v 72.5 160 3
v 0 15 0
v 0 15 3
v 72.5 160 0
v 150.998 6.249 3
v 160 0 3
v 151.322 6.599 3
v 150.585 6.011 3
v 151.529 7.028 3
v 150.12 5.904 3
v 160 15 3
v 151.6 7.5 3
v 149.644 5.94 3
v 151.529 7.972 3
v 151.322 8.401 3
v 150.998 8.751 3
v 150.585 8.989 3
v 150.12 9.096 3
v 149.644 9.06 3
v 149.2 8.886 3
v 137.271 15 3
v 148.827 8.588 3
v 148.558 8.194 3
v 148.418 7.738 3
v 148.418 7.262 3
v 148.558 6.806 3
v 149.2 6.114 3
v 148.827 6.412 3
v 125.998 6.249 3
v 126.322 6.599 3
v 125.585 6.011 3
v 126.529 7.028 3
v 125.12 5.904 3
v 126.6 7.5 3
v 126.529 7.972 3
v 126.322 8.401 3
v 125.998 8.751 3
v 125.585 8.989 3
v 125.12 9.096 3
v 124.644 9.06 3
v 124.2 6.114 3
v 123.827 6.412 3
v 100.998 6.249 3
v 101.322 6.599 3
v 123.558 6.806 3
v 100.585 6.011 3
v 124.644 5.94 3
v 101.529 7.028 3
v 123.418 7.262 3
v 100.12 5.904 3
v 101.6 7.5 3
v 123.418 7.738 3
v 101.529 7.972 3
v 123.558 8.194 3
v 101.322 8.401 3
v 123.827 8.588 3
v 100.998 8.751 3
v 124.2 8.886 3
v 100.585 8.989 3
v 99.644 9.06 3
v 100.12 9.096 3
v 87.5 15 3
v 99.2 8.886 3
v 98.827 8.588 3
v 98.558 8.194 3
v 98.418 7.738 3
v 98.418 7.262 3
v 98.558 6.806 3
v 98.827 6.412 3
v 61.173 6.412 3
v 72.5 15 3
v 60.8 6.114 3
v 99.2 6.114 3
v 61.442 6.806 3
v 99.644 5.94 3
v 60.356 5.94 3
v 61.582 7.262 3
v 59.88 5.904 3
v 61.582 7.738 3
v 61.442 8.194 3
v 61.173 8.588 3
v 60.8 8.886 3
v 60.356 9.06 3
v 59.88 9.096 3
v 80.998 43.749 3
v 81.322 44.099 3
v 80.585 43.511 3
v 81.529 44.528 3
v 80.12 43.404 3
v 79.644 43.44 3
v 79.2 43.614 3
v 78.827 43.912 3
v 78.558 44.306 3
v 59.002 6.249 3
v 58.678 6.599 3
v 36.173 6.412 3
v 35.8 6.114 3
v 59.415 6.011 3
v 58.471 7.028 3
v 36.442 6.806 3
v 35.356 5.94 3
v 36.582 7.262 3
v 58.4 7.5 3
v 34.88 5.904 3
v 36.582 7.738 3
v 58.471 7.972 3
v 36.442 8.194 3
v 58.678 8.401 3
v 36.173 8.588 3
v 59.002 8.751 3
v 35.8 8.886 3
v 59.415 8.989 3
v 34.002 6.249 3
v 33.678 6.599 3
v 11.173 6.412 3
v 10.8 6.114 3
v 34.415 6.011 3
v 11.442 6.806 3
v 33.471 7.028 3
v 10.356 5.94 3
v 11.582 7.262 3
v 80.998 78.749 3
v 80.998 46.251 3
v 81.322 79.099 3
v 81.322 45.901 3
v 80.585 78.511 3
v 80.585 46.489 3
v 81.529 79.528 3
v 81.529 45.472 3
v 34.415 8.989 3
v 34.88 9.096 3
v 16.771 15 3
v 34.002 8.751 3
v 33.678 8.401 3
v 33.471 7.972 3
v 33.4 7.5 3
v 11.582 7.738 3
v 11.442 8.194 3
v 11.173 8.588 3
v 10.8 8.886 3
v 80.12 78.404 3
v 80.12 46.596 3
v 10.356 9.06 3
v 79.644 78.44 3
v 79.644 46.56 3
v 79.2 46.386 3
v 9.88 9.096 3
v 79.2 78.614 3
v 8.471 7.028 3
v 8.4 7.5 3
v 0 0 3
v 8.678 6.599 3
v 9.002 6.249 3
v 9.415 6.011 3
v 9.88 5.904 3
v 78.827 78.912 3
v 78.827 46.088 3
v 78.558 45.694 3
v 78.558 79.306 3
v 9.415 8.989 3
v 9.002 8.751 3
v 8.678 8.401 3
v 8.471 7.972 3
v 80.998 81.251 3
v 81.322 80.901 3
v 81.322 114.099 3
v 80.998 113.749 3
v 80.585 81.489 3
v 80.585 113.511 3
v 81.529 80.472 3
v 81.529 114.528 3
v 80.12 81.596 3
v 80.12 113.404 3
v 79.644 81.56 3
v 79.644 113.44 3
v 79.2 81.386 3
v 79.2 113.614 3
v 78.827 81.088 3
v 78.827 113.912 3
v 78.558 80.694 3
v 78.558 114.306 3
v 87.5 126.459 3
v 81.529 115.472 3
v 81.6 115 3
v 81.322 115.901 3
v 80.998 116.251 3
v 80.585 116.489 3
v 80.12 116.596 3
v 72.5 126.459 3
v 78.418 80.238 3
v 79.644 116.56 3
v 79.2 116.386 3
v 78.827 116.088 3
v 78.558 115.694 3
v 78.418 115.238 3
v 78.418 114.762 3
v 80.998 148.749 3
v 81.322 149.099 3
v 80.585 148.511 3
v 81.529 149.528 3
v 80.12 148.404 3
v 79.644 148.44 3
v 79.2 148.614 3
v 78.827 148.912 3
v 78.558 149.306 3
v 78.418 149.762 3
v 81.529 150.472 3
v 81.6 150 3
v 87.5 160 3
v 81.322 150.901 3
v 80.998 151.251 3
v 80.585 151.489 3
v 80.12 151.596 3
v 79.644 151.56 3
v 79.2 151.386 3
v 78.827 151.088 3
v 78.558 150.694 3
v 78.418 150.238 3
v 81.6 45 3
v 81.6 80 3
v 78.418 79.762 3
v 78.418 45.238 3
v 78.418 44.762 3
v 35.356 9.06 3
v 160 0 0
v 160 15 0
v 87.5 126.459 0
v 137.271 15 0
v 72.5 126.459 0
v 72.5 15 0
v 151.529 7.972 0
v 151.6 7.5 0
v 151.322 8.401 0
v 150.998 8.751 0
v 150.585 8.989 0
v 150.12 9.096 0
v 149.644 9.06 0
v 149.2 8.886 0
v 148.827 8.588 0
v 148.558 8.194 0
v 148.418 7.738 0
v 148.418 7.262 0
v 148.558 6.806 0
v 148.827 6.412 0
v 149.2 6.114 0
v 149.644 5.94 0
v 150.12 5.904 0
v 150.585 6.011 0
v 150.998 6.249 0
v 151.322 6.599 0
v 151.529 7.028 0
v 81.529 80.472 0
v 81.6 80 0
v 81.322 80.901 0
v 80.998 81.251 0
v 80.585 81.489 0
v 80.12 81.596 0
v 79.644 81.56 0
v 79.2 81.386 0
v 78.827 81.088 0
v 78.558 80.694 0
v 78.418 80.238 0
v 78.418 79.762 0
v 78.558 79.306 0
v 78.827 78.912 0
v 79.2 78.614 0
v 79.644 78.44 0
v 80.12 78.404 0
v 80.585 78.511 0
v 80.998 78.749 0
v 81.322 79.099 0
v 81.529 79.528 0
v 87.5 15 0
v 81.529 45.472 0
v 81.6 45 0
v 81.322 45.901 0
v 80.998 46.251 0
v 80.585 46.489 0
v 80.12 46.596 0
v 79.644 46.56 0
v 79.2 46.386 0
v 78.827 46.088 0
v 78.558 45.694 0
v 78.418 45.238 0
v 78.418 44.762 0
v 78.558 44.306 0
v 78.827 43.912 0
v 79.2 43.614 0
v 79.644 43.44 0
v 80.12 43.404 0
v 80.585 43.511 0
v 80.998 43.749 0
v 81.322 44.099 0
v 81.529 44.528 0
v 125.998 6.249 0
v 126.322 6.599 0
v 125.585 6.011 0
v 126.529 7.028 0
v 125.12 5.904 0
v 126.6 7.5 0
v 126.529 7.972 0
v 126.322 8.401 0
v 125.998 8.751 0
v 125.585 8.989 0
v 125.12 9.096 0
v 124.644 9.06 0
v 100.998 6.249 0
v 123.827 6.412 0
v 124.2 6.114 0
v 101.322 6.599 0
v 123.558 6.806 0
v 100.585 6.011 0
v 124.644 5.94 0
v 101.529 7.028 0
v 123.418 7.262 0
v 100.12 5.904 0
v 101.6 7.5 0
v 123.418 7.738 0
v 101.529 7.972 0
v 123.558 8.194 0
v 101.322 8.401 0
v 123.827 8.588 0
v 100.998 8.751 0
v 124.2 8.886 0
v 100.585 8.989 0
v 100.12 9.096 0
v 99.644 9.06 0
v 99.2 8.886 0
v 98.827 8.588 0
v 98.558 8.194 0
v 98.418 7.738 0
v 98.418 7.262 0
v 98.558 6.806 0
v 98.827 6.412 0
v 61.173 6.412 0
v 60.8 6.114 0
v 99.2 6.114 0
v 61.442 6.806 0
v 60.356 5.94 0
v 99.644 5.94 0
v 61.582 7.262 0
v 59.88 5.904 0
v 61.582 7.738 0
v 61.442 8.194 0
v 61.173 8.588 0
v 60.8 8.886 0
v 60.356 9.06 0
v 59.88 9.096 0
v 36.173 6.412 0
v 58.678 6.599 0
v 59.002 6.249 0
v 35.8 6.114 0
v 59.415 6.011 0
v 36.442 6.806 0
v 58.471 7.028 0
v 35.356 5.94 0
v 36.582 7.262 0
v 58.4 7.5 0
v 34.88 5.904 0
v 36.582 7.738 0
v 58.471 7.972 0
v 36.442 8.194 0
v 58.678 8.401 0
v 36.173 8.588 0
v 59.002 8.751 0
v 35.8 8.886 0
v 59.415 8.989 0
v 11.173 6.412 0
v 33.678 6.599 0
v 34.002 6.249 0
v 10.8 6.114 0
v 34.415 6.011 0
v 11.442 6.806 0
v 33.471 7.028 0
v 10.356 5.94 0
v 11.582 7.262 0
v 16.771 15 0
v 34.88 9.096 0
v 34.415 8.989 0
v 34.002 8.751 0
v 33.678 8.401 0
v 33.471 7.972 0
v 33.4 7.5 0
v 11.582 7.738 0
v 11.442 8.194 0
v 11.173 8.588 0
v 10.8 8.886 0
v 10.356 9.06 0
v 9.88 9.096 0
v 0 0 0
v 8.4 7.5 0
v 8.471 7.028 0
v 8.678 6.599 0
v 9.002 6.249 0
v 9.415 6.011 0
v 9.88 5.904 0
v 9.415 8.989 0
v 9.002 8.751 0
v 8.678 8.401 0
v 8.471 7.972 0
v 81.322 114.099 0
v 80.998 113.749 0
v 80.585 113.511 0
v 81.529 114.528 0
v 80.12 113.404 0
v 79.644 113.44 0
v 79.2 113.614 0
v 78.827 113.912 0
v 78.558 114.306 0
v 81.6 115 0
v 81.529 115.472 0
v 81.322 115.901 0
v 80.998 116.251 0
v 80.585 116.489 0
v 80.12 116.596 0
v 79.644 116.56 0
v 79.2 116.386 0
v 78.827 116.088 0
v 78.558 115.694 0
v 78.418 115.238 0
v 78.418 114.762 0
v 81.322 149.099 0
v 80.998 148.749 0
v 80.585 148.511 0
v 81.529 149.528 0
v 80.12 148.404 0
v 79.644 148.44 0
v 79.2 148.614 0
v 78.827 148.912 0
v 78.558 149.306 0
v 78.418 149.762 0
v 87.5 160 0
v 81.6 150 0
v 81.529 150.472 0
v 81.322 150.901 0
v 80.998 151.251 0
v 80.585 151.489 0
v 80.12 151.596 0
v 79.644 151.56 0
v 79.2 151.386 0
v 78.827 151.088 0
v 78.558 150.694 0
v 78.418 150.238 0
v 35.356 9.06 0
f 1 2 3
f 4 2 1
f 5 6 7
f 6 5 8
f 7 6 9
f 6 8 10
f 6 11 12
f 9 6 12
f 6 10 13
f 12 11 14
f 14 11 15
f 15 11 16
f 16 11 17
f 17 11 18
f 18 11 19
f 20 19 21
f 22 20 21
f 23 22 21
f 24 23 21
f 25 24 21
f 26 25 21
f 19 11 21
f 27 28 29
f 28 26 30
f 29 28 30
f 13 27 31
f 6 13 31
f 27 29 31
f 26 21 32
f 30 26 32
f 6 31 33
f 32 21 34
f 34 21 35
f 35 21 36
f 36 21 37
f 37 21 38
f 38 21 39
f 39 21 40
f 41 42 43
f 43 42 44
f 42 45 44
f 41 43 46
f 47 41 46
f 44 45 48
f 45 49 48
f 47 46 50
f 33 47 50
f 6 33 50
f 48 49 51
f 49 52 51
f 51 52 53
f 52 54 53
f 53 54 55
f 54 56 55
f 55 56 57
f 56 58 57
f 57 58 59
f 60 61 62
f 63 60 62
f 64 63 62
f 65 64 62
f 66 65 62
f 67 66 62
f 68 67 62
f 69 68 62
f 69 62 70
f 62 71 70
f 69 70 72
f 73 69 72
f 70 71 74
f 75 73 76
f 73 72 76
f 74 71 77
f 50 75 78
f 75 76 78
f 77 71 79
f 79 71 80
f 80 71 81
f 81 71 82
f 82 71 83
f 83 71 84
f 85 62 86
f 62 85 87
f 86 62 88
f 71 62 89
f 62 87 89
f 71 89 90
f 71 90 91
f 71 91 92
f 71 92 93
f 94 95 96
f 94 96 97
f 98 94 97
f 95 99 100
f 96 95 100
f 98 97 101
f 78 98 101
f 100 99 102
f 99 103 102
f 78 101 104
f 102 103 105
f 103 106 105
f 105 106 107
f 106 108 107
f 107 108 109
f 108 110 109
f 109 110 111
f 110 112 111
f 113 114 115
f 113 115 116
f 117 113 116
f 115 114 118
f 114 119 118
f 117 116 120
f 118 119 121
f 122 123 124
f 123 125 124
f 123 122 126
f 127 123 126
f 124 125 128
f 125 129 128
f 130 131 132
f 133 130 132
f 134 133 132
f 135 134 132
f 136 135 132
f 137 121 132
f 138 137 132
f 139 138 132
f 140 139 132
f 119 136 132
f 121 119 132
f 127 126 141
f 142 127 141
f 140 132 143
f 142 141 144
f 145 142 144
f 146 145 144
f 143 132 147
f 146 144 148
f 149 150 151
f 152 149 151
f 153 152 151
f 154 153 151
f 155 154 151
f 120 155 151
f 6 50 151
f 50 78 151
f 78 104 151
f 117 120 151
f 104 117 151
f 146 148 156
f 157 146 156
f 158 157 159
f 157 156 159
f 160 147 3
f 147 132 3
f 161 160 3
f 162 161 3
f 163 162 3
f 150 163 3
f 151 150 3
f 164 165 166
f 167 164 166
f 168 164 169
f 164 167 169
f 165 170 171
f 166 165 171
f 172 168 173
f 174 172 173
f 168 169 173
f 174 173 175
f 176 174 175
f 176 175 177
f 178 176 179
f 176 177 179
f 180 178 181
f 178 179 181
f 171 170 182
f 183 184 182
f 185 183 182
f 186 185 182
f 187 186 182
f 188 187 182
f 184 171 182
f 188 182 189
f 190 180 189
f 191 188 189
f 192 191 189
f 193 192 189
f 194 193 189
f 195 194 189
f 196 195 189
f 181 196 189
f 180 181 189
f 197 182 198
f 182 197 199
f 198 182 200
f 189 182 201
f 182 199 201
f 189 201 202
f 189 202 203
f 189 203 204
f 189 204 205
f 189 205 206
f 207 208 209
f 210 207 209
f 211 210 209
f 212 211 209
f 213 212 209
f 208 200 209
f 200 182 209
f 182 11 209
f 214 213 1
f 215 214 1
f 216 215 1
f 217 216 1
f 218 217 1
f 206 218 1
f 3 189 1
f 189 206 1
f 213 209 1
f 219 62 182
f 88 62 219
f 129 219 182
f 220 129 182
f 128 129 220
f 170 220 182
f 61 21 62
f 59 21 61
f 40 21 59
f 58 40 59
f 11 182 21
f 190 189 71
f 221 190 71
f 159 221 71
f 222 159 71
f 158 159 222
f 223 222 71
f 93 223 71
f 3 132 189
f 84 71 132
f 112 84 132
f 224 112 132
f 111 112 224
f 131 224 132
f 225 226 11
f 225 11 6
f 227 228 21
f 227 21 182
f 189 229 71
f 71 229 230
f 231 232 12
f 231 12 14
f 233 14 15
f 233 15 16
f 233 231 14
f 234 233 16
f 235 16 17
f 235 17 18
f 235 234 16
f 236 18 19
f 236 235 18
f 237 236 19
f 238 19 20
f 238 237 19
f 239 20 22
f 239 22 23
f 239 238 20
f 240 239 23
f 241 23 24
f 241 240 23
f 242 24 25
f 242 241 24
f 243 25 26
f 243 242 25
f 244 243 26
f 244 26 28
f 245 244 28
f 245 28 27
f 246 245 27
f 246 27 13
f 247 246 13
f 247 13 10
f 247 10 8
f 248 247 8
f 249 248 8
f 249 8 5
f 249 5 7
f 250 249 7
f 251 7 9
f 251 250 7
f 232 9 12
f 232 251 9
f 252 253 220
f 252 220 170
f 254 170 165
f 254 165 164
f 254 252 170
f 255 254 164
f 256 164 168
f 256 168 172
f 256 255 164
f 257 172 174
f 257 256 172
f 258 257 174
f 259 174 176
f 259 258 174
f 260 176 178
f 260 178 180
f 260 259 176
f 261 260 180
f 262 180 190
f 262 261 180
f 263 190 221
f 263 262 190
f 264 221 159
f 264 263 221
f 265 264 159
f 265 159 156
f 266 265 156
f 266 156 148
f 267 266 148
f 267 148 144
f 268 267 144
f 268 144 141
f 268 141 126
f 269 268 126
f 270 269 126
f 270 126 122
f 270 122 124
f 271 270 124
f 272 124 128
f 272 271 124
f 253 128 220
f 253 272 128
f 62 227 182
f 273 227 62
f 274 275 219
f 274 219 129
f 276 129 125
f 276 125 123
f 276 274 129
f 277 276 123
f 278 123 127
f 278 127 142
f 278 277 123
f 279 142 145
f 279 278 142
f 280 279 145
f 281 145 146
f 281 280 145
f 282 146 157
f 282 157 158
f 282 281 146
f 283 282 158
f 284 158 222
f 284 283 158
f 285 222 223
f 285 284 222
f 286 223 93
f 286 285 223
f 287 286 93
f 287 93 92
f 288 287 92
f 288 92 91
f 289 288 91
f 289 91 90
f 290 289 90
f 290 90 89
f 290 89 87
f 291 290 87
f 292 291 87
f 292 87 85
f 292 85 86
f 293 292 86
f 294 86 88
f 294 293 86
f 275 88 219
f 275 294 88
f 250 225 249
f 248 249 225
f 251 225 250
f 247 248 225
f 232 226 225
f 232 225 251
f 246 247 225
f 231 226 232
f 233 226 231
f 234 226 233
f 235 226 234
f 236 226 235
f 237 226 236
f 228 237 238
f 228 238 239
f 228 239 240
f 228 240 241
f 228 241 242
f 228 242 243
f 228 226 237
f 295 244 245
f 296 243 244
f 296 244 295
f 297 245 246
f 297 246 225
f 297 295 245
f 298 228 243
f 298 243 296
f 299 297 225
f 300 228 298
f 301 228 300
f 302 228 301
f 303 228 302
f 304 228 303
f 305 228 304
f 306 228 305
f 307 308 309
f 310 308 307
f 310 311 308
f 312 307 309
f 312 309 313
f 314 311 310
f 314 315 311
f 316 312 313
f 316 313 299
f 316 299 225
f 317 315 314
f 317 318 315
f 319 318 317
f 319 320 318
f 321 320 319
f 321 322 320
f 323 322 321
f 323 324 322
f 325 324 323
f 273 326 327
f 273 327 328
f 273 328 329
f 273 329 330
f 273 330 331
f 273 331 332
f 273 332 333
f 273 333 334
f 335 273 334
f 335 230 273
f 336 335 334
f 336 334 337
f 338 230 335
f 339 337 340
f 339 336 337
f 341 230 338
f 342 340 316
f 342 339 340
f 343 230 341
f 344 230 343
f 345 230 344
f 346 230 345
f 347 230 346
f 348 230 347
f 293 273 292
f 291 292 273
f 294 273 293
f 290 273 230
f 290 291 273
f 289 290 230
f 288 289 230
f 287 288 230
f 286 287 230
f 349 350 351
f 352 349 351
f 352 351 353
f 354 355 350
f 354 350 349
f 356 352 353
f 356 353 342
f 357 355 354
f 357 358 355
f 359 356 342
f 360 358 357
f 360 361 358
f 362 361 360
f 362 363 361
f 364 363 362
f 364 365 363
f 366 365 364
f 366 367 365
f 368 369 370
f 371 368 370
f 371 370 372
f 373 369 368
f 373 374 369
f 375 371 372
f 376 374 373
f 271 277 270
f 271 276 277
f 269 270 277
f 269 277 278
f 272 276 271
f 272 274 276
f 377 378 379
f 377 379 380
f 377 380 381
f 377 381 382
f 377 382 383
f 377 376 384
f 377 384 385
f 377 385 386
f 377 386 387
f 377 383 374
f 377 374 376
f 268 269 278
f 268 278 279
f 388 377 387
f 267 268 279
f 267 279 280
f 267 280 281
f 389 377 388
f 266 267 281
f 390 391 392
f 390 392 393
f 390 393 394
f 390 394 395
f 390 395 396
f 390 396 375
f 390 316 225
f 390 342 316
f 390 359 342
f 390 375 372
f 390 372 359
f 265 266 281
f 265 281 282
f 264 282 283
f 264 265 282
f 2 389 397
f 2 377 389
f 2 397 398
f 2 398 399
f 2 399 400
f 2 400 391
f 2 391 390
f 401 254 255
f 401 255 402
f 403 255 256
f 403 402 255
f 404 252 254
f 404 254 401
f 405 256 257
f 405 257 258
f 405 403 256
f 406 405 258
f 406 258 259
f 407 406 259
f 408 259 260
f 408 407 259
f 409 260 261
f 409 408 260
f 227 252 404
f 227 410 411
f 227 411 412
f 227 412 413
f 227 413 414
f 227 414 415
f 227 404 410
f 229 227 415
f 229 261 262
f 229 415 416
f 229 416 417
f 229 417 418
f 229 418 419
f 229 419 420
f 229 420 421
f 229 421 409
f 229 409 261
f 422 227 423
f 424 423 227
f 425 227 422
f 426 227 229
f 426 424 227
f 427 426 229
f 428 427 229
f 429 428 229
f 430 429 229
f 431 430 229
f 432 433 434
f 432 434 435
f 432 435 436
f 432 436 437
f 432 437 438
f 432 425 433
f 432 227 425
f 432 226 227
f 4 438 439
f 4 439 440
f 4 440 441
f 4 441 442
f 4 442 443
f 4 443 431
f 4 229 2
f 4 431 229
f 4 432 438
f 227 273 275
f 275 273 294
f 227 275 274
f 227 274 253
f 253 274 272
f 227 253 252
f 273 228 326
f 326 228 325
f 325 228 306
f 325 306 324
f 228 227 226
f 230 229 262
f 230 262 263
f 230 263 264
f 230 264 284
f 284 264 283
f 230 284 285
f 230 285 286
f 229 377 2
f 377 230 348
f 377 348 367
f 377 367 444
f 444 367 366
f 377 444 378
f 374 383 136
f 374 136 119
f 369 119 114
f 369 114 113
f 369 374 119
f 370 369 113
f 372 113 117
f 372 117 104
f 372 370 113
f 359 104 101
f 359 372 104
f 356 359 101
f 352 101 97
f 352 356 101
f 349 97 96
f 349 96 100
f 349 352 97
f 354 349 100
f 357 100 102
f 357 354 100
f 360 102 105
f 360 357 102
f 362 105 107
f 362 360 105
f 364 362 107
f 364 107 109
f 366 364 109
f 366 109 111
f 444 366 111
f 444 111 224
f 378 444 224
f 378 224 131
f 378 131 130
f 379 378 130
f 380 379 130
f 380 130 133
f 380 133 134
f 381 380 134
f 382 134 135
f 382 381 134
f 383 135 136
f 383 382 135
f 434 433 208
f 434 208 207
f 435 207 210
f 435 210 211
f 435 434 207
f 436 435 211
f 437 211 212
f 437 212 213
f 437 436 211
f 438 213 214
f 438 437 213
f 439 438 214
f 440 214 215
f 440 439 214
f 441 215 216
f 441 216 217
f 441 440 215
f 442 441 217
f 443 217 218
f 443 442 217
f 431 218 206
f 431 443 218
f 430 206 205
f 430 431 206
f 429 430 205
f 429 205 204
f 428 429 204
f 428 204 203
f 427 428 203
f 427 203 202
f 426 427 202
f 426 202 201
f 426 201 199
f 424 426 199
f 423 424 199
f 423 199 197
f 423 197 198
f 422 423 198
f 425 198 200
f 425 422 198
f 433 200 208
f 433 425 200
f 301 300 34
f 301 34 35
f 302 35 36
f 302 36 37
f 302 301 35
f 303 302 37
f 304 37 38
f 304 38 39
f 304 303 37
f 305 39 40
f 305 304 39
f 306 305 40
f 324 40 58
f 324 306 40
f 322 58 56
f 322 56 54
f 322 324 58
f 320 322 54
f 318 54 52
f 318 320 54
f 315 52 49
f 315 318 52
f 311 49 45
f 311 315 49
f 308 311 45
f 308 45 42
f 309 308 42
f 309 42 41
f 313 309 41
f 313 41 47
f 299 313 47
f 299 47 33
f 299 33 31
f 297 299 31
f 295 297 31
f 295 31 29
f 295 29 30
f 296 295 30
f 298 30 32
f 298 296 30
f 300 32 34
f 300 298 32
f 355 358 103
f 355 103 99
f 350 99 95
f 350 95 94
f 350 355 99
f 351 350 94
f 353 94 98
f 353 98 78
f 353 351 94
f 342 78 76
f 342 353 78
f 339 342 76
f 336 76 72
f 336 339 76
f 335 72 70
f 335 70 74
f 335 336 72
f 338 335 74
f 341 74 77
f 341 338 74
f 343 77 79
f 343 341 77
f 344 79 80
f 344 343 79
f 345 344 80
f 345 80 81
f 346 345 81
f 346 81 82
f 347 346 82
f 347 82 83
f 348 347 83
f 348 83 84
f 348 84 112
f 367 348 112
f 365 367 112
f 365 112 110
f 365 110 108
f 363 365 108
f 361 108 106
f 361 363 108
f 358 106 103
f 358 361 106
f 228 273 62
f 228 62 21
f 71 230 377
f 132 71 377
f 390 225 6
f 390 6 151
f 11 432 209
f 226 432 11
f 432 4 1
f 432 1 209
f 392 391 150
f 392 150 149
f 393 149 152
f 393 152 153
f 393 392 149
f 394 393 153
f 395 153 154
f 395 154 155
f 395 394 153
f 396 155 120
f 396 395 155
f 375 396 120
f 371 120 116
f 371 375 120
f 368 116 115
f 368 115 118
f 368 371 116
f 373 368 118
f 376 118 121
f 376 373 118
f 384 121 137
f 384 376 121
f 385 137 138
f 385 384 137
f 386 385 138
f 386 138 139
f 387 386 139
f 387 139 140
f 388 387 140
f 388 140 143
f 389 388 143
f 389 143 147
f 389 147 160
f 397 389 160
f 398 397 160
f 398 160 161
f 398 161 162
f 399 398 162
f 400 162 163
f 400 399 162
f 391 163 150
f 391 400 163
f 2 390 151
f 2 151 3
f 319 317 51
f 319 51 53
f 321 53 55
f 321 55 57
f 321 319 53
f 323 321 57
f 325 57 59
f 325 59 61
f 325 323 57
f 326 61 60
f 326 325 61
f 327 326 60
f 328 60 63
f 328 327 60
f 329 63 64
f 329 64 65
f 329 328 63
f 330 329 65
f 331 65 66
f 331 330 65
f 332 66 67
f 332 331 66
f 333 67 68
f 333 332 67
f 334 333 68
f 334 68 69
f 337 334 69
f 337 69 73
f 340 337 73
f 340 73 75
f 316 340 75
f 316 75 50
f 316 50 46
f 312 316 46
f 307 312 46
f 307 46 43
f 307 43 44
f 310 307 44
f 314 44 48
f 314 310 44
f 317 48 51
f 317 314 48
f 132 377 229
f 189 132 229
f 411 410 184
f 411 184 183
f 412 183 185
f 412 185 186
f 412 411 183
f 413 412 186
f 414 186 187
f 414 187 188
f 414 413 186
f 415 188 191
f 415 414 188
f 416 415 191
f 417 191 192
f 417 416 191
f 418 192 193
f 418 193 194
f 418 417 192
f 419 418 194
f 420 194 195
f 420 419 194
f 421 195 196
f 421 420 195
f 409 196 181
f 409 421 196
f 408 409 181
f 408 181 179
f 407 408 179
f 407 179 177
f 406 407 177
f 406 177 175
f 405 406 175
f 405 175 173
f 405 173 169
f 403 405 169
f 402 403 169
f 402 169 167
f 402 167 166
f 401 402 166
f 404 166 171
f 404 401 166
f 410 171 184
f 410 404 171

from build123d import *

# Parameters (mm, degrees)
SKETCH1_R           = 1.6
BOSS_EXTRUDE1_DEPTH = 3


with BuildPart() as part:
    # Sketch1 → Boss-Extrude1 (new body)
    with BuildSketch(Plane.XY):
        Polygon((0, 15), (72.5, 160), (87.5, 160), (160, 15), (160, 0), (0, 0), align=None)
        with Locations((150, 7.5)):
            Circle(SKETCH1_R, mode=Mode.SUBTRACT)
        with Locations((125, 7.5)):
            Circle(SKETCH1_R, mode=Mode.SUBTRACT)
        with Locations((100, 7.5)):
            Circle(SKETCH1_R, mode=Mode.SUBTRACT)
        with Locations(Location((10, 7.5, 0), (0, 0, 180))):
            Circle(SKETCH1_R, mode=Mode.SUBTRACT)
        with Locations(Location((35, 7.5, 0), (0, 0, 180))):
            Circle(SKETCH1_R, mode=Mode.SUBTRACT)
        with Locations(Location((60, 7.5, 0), (0, 0, 180))):
            Circle(SKETCH1_R, mode=Mode.SUBTRACT)
        with Locations((80, 150)):
            Circle(SKETCH1_R, mode=Mode.SUBTRACT)
        with Locations((80, 115)):
            Circle(SKETCH1_R, mode=Mode.SUBTRACT)
        with Locations((80, 80)):
            Circle(SKETCH1_R, mode=Mode.SUBTRACT)
        with Locations((80, 45)):
            Circle(SKETCH1_R, mode=Mode.SUBTRACT)
        Polygon((72.5, 126.458980338), (72.5, 15), (16.770509831, 15), align=None, mode=Mode.SUBTRACT)
        Polygon((87.5, 15), (137.271498835, 15), (87.5, 126.458980338), align=None, mode=Mode.SUBTRACT)
    extrude(amount=BOSS_EXTRUDE1_DEPTH)


solid = part.part
